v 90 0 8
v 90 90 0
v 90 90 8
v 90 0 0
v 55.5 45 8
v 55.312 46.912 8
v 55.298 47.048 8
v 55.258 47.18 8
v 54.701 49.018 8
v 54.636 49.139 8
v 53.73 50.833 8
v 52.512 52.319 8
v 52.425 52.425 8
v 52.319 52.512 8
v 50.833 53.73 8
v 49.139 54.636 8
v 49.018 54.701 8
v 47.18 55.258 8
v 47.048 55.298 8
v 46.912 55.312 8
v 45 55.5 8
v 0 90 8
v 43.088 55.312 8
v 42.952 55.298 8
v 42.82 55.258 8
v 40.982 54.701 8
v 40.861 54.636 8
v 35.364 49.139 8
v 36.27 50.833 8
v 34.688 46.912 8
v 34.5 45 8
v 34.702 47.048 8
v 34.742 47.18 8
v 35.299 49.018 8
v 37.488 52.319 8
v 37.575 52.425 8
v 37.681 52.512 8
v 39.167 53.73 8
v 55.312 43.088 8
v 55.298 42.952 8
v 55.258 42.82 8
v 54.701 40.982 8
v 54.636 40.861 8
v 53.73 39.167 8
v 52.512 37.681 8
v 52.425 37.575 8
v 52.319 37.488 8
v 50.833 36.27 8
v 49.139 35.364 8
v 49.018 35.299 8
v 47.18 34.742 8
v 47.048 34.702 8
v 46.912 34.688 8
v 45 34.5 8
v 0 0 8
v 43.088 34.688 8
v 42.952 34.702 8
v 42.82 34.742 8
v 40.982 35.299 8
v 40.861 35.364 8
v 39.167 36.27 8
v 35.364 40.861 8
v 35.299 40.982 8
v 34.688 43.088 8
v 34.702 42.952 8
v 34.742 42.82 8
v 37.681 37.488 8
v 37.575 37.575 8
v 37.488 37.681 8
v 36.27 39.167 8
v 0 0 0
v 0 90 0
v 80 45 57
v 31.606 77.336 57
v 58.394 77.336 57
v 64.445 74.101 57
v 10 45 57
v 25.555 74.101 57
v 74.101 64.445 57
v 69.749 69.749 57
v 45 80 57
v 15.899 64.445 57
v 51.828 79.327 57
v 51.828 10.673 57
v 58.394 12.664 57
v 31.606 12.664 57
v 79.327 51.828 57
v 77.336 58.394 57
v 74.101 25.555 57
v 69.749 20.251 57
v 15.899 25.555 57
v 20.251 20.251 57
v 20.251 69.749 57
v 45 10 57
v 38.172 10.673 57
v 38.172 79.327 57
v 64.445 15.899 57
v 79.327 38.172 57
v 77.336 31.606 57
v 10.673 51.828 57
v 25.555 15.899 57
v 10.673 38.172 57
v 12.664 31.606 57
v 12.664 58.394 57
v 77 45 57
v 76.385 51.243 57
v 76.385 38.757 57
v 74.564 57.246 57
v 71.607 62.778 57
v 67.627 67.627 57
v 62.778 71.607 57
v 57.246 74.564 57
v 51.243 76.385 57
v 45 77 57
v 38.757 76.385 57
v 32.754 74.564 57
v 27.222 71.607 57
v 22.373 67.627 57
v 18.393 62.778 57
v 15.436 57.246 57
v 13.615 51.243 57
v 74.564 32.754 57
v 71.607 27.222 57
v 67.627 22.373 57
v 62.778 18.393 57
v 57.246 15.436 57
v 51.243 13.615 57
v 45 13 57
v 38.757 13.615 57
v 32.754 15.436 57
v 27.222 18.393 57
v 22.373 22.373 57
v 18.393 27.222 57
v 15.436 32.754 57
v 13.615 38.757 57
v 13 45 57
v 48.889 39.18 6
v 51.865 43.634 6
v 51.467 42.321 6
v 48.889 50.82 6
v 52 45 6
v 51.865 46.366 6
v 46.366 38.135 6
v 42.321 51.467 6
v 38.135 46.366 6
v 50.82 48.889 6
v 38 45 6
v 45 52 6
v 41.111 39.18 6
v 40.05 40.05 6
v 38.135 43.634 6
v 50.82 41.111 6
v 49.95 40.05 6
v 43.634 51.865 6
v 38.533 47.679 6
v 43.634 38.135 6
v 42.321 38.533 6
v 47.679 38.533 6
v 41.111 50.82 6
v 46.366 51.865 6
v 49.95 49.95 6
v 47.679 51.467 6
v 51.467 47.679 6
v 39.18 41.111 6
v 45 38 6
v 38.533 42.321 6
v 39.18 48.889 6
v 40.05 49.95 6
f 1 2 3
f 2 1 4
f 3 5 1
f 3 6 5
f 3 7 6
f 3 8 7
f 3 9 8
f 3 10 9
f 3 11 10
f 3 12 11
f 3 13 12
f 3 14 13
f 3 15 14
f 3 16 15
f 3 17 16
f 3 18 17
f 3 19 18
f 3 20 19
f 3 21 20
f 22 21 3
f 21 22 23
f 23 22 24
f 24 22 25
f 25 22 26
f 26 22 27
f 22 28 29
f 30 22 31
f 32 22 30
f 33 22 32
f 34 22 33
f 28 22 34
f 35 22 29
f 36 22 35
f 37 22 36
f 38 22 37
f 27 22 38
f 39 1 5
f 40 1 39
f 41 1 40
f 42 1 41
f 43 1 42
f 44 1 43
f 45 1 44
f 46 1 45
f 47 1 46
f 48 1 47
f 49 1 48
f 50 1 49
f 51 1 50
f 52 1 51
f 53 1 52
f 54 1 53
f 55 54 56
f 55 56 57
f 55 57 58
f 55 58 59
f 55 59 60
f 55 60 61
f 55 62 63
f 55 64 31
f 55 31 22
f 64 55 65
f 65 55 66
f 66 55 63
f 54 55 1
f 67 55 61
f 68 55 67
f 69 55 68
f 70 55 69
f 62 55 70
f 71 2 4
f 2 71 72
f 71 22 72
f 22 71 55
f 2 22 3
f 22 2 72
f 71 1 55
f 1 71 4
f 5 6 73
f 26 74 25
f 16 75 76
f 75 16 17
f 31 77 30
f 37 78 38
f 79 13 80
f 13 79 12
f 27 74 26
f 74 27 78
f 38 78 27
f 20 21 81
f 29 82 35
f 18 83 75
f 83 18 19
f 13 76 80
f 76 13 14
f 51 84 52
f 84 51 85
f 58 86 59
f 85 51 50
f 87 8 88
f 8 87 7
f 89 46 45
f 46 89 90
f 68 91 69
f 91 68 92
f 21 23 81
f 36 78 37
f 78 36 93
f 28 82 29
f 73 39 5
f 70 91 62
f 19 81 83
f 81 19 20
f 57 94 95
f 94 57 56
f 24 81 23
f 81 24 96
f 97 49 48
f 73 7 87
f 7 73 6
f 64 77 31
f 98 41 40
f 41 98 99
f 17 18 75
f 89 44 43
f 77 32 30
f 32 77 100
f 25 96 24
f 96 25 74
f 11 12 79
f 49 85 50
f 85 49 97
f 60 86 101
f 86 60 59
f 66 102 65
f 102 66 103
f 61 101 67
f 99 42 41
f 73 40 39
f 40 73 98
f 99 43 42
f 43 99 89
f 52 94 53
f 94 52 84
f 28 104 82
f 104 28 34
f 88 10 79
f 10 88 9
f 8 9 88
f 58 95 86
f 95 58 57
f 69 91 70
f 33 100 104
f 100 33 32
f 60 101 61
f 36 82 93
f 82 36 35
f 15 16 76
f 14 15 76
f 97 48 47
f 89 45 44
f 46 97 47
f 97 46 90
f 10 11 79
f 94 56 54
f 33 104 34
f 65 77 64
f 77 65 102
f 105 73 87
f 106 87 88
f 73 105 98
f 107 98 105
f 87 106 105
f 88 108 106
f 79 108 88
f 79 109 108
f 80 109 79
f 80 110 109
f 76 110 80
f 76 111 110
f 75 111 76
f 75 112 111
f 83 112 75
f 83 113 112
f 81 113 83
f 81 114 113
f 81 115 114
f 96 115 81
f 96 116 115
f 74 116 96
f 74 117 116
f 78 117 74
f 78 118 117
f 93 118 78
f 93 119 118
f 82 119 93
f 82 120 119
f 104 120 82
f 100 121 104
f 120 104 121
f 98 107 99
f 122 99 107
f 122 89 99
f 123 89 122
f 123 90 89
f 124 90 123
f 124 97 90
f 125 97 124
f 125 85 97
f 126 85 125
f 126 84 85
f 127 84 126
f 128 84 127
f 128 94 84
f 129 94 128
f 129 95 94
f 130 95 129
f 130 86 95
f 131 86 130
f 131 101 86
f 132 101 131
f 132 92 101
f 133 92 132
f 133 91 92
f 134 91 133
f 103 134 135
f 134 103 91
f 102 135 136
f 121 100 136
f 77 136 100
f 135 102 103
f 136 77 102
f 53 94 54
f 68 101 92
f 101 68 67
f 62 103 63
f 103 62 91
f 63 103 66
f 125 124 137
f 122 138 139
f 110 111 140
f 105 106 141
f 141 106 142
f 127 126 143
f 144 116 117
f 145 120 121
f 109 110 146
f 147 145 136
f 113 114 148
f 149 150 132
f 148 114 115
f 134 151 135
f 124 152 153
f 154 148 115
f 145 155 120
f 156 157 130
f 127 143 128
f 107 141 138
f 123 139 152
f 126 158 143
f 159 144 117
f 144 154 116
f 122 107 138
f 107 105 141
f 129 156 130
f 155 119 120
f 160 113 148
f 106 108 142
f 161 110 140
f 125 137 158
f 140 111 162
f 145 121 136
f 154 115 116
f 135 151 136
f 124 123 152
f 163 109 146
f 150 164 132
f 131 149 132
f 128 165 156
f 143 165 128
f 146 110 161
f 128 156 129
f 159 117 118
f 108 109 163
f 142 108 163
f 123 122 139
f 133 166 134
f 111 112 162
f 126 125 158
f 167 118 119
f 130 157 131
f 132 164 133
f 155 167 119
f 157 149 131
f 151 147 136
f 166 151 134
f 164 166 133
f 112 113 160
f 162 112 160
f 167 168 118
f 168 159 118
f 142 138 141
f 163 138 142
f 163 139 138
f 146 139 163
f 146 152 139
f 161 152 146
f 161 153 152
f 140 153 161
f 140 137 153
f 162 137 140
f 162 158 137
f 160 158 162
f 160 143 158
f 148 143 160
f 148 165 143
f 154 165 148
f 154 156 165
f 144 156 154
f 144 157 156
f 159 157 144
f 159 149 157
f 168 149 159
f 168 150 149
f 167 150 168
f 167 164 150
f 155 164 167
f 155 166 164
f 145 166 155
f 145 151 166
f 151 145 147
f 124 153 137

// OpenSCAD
$fn = 32;

// ----------------------------------------------------------------------
// Hopper: funnel with square flange
// ----------------------------------------------------------------------

// --- parameters (mm) ---
fl = 90;                  // flange side, X and Y
fl_t = 8;                 // flange thickness
cone_h = 50;              // cone height above the flange
top_d = 70;               // cone mouth diameter
bot_d = 20;               // cone spout diameter
wall = 3;                 // cone wall thickness

bore_d = bot_d - 2 * wall;  // spout bore diameter
total_h = fl_t + cone_h - 1;  // overall height

difference() {
  union() {
    cube([fl, fl, fl_t]);
    translate([fl / 2, fl / 2, fl_t - 1])
      cylinder(h = cone_h, d1 = bot_d, d2 = top_d);
  }
  translate([fl / 2, fl / 2, fl_t - 2])
    cylinder(h = cone_h + 1, d1 = bore_d, d2 = top_d - 2 * wall);
}
